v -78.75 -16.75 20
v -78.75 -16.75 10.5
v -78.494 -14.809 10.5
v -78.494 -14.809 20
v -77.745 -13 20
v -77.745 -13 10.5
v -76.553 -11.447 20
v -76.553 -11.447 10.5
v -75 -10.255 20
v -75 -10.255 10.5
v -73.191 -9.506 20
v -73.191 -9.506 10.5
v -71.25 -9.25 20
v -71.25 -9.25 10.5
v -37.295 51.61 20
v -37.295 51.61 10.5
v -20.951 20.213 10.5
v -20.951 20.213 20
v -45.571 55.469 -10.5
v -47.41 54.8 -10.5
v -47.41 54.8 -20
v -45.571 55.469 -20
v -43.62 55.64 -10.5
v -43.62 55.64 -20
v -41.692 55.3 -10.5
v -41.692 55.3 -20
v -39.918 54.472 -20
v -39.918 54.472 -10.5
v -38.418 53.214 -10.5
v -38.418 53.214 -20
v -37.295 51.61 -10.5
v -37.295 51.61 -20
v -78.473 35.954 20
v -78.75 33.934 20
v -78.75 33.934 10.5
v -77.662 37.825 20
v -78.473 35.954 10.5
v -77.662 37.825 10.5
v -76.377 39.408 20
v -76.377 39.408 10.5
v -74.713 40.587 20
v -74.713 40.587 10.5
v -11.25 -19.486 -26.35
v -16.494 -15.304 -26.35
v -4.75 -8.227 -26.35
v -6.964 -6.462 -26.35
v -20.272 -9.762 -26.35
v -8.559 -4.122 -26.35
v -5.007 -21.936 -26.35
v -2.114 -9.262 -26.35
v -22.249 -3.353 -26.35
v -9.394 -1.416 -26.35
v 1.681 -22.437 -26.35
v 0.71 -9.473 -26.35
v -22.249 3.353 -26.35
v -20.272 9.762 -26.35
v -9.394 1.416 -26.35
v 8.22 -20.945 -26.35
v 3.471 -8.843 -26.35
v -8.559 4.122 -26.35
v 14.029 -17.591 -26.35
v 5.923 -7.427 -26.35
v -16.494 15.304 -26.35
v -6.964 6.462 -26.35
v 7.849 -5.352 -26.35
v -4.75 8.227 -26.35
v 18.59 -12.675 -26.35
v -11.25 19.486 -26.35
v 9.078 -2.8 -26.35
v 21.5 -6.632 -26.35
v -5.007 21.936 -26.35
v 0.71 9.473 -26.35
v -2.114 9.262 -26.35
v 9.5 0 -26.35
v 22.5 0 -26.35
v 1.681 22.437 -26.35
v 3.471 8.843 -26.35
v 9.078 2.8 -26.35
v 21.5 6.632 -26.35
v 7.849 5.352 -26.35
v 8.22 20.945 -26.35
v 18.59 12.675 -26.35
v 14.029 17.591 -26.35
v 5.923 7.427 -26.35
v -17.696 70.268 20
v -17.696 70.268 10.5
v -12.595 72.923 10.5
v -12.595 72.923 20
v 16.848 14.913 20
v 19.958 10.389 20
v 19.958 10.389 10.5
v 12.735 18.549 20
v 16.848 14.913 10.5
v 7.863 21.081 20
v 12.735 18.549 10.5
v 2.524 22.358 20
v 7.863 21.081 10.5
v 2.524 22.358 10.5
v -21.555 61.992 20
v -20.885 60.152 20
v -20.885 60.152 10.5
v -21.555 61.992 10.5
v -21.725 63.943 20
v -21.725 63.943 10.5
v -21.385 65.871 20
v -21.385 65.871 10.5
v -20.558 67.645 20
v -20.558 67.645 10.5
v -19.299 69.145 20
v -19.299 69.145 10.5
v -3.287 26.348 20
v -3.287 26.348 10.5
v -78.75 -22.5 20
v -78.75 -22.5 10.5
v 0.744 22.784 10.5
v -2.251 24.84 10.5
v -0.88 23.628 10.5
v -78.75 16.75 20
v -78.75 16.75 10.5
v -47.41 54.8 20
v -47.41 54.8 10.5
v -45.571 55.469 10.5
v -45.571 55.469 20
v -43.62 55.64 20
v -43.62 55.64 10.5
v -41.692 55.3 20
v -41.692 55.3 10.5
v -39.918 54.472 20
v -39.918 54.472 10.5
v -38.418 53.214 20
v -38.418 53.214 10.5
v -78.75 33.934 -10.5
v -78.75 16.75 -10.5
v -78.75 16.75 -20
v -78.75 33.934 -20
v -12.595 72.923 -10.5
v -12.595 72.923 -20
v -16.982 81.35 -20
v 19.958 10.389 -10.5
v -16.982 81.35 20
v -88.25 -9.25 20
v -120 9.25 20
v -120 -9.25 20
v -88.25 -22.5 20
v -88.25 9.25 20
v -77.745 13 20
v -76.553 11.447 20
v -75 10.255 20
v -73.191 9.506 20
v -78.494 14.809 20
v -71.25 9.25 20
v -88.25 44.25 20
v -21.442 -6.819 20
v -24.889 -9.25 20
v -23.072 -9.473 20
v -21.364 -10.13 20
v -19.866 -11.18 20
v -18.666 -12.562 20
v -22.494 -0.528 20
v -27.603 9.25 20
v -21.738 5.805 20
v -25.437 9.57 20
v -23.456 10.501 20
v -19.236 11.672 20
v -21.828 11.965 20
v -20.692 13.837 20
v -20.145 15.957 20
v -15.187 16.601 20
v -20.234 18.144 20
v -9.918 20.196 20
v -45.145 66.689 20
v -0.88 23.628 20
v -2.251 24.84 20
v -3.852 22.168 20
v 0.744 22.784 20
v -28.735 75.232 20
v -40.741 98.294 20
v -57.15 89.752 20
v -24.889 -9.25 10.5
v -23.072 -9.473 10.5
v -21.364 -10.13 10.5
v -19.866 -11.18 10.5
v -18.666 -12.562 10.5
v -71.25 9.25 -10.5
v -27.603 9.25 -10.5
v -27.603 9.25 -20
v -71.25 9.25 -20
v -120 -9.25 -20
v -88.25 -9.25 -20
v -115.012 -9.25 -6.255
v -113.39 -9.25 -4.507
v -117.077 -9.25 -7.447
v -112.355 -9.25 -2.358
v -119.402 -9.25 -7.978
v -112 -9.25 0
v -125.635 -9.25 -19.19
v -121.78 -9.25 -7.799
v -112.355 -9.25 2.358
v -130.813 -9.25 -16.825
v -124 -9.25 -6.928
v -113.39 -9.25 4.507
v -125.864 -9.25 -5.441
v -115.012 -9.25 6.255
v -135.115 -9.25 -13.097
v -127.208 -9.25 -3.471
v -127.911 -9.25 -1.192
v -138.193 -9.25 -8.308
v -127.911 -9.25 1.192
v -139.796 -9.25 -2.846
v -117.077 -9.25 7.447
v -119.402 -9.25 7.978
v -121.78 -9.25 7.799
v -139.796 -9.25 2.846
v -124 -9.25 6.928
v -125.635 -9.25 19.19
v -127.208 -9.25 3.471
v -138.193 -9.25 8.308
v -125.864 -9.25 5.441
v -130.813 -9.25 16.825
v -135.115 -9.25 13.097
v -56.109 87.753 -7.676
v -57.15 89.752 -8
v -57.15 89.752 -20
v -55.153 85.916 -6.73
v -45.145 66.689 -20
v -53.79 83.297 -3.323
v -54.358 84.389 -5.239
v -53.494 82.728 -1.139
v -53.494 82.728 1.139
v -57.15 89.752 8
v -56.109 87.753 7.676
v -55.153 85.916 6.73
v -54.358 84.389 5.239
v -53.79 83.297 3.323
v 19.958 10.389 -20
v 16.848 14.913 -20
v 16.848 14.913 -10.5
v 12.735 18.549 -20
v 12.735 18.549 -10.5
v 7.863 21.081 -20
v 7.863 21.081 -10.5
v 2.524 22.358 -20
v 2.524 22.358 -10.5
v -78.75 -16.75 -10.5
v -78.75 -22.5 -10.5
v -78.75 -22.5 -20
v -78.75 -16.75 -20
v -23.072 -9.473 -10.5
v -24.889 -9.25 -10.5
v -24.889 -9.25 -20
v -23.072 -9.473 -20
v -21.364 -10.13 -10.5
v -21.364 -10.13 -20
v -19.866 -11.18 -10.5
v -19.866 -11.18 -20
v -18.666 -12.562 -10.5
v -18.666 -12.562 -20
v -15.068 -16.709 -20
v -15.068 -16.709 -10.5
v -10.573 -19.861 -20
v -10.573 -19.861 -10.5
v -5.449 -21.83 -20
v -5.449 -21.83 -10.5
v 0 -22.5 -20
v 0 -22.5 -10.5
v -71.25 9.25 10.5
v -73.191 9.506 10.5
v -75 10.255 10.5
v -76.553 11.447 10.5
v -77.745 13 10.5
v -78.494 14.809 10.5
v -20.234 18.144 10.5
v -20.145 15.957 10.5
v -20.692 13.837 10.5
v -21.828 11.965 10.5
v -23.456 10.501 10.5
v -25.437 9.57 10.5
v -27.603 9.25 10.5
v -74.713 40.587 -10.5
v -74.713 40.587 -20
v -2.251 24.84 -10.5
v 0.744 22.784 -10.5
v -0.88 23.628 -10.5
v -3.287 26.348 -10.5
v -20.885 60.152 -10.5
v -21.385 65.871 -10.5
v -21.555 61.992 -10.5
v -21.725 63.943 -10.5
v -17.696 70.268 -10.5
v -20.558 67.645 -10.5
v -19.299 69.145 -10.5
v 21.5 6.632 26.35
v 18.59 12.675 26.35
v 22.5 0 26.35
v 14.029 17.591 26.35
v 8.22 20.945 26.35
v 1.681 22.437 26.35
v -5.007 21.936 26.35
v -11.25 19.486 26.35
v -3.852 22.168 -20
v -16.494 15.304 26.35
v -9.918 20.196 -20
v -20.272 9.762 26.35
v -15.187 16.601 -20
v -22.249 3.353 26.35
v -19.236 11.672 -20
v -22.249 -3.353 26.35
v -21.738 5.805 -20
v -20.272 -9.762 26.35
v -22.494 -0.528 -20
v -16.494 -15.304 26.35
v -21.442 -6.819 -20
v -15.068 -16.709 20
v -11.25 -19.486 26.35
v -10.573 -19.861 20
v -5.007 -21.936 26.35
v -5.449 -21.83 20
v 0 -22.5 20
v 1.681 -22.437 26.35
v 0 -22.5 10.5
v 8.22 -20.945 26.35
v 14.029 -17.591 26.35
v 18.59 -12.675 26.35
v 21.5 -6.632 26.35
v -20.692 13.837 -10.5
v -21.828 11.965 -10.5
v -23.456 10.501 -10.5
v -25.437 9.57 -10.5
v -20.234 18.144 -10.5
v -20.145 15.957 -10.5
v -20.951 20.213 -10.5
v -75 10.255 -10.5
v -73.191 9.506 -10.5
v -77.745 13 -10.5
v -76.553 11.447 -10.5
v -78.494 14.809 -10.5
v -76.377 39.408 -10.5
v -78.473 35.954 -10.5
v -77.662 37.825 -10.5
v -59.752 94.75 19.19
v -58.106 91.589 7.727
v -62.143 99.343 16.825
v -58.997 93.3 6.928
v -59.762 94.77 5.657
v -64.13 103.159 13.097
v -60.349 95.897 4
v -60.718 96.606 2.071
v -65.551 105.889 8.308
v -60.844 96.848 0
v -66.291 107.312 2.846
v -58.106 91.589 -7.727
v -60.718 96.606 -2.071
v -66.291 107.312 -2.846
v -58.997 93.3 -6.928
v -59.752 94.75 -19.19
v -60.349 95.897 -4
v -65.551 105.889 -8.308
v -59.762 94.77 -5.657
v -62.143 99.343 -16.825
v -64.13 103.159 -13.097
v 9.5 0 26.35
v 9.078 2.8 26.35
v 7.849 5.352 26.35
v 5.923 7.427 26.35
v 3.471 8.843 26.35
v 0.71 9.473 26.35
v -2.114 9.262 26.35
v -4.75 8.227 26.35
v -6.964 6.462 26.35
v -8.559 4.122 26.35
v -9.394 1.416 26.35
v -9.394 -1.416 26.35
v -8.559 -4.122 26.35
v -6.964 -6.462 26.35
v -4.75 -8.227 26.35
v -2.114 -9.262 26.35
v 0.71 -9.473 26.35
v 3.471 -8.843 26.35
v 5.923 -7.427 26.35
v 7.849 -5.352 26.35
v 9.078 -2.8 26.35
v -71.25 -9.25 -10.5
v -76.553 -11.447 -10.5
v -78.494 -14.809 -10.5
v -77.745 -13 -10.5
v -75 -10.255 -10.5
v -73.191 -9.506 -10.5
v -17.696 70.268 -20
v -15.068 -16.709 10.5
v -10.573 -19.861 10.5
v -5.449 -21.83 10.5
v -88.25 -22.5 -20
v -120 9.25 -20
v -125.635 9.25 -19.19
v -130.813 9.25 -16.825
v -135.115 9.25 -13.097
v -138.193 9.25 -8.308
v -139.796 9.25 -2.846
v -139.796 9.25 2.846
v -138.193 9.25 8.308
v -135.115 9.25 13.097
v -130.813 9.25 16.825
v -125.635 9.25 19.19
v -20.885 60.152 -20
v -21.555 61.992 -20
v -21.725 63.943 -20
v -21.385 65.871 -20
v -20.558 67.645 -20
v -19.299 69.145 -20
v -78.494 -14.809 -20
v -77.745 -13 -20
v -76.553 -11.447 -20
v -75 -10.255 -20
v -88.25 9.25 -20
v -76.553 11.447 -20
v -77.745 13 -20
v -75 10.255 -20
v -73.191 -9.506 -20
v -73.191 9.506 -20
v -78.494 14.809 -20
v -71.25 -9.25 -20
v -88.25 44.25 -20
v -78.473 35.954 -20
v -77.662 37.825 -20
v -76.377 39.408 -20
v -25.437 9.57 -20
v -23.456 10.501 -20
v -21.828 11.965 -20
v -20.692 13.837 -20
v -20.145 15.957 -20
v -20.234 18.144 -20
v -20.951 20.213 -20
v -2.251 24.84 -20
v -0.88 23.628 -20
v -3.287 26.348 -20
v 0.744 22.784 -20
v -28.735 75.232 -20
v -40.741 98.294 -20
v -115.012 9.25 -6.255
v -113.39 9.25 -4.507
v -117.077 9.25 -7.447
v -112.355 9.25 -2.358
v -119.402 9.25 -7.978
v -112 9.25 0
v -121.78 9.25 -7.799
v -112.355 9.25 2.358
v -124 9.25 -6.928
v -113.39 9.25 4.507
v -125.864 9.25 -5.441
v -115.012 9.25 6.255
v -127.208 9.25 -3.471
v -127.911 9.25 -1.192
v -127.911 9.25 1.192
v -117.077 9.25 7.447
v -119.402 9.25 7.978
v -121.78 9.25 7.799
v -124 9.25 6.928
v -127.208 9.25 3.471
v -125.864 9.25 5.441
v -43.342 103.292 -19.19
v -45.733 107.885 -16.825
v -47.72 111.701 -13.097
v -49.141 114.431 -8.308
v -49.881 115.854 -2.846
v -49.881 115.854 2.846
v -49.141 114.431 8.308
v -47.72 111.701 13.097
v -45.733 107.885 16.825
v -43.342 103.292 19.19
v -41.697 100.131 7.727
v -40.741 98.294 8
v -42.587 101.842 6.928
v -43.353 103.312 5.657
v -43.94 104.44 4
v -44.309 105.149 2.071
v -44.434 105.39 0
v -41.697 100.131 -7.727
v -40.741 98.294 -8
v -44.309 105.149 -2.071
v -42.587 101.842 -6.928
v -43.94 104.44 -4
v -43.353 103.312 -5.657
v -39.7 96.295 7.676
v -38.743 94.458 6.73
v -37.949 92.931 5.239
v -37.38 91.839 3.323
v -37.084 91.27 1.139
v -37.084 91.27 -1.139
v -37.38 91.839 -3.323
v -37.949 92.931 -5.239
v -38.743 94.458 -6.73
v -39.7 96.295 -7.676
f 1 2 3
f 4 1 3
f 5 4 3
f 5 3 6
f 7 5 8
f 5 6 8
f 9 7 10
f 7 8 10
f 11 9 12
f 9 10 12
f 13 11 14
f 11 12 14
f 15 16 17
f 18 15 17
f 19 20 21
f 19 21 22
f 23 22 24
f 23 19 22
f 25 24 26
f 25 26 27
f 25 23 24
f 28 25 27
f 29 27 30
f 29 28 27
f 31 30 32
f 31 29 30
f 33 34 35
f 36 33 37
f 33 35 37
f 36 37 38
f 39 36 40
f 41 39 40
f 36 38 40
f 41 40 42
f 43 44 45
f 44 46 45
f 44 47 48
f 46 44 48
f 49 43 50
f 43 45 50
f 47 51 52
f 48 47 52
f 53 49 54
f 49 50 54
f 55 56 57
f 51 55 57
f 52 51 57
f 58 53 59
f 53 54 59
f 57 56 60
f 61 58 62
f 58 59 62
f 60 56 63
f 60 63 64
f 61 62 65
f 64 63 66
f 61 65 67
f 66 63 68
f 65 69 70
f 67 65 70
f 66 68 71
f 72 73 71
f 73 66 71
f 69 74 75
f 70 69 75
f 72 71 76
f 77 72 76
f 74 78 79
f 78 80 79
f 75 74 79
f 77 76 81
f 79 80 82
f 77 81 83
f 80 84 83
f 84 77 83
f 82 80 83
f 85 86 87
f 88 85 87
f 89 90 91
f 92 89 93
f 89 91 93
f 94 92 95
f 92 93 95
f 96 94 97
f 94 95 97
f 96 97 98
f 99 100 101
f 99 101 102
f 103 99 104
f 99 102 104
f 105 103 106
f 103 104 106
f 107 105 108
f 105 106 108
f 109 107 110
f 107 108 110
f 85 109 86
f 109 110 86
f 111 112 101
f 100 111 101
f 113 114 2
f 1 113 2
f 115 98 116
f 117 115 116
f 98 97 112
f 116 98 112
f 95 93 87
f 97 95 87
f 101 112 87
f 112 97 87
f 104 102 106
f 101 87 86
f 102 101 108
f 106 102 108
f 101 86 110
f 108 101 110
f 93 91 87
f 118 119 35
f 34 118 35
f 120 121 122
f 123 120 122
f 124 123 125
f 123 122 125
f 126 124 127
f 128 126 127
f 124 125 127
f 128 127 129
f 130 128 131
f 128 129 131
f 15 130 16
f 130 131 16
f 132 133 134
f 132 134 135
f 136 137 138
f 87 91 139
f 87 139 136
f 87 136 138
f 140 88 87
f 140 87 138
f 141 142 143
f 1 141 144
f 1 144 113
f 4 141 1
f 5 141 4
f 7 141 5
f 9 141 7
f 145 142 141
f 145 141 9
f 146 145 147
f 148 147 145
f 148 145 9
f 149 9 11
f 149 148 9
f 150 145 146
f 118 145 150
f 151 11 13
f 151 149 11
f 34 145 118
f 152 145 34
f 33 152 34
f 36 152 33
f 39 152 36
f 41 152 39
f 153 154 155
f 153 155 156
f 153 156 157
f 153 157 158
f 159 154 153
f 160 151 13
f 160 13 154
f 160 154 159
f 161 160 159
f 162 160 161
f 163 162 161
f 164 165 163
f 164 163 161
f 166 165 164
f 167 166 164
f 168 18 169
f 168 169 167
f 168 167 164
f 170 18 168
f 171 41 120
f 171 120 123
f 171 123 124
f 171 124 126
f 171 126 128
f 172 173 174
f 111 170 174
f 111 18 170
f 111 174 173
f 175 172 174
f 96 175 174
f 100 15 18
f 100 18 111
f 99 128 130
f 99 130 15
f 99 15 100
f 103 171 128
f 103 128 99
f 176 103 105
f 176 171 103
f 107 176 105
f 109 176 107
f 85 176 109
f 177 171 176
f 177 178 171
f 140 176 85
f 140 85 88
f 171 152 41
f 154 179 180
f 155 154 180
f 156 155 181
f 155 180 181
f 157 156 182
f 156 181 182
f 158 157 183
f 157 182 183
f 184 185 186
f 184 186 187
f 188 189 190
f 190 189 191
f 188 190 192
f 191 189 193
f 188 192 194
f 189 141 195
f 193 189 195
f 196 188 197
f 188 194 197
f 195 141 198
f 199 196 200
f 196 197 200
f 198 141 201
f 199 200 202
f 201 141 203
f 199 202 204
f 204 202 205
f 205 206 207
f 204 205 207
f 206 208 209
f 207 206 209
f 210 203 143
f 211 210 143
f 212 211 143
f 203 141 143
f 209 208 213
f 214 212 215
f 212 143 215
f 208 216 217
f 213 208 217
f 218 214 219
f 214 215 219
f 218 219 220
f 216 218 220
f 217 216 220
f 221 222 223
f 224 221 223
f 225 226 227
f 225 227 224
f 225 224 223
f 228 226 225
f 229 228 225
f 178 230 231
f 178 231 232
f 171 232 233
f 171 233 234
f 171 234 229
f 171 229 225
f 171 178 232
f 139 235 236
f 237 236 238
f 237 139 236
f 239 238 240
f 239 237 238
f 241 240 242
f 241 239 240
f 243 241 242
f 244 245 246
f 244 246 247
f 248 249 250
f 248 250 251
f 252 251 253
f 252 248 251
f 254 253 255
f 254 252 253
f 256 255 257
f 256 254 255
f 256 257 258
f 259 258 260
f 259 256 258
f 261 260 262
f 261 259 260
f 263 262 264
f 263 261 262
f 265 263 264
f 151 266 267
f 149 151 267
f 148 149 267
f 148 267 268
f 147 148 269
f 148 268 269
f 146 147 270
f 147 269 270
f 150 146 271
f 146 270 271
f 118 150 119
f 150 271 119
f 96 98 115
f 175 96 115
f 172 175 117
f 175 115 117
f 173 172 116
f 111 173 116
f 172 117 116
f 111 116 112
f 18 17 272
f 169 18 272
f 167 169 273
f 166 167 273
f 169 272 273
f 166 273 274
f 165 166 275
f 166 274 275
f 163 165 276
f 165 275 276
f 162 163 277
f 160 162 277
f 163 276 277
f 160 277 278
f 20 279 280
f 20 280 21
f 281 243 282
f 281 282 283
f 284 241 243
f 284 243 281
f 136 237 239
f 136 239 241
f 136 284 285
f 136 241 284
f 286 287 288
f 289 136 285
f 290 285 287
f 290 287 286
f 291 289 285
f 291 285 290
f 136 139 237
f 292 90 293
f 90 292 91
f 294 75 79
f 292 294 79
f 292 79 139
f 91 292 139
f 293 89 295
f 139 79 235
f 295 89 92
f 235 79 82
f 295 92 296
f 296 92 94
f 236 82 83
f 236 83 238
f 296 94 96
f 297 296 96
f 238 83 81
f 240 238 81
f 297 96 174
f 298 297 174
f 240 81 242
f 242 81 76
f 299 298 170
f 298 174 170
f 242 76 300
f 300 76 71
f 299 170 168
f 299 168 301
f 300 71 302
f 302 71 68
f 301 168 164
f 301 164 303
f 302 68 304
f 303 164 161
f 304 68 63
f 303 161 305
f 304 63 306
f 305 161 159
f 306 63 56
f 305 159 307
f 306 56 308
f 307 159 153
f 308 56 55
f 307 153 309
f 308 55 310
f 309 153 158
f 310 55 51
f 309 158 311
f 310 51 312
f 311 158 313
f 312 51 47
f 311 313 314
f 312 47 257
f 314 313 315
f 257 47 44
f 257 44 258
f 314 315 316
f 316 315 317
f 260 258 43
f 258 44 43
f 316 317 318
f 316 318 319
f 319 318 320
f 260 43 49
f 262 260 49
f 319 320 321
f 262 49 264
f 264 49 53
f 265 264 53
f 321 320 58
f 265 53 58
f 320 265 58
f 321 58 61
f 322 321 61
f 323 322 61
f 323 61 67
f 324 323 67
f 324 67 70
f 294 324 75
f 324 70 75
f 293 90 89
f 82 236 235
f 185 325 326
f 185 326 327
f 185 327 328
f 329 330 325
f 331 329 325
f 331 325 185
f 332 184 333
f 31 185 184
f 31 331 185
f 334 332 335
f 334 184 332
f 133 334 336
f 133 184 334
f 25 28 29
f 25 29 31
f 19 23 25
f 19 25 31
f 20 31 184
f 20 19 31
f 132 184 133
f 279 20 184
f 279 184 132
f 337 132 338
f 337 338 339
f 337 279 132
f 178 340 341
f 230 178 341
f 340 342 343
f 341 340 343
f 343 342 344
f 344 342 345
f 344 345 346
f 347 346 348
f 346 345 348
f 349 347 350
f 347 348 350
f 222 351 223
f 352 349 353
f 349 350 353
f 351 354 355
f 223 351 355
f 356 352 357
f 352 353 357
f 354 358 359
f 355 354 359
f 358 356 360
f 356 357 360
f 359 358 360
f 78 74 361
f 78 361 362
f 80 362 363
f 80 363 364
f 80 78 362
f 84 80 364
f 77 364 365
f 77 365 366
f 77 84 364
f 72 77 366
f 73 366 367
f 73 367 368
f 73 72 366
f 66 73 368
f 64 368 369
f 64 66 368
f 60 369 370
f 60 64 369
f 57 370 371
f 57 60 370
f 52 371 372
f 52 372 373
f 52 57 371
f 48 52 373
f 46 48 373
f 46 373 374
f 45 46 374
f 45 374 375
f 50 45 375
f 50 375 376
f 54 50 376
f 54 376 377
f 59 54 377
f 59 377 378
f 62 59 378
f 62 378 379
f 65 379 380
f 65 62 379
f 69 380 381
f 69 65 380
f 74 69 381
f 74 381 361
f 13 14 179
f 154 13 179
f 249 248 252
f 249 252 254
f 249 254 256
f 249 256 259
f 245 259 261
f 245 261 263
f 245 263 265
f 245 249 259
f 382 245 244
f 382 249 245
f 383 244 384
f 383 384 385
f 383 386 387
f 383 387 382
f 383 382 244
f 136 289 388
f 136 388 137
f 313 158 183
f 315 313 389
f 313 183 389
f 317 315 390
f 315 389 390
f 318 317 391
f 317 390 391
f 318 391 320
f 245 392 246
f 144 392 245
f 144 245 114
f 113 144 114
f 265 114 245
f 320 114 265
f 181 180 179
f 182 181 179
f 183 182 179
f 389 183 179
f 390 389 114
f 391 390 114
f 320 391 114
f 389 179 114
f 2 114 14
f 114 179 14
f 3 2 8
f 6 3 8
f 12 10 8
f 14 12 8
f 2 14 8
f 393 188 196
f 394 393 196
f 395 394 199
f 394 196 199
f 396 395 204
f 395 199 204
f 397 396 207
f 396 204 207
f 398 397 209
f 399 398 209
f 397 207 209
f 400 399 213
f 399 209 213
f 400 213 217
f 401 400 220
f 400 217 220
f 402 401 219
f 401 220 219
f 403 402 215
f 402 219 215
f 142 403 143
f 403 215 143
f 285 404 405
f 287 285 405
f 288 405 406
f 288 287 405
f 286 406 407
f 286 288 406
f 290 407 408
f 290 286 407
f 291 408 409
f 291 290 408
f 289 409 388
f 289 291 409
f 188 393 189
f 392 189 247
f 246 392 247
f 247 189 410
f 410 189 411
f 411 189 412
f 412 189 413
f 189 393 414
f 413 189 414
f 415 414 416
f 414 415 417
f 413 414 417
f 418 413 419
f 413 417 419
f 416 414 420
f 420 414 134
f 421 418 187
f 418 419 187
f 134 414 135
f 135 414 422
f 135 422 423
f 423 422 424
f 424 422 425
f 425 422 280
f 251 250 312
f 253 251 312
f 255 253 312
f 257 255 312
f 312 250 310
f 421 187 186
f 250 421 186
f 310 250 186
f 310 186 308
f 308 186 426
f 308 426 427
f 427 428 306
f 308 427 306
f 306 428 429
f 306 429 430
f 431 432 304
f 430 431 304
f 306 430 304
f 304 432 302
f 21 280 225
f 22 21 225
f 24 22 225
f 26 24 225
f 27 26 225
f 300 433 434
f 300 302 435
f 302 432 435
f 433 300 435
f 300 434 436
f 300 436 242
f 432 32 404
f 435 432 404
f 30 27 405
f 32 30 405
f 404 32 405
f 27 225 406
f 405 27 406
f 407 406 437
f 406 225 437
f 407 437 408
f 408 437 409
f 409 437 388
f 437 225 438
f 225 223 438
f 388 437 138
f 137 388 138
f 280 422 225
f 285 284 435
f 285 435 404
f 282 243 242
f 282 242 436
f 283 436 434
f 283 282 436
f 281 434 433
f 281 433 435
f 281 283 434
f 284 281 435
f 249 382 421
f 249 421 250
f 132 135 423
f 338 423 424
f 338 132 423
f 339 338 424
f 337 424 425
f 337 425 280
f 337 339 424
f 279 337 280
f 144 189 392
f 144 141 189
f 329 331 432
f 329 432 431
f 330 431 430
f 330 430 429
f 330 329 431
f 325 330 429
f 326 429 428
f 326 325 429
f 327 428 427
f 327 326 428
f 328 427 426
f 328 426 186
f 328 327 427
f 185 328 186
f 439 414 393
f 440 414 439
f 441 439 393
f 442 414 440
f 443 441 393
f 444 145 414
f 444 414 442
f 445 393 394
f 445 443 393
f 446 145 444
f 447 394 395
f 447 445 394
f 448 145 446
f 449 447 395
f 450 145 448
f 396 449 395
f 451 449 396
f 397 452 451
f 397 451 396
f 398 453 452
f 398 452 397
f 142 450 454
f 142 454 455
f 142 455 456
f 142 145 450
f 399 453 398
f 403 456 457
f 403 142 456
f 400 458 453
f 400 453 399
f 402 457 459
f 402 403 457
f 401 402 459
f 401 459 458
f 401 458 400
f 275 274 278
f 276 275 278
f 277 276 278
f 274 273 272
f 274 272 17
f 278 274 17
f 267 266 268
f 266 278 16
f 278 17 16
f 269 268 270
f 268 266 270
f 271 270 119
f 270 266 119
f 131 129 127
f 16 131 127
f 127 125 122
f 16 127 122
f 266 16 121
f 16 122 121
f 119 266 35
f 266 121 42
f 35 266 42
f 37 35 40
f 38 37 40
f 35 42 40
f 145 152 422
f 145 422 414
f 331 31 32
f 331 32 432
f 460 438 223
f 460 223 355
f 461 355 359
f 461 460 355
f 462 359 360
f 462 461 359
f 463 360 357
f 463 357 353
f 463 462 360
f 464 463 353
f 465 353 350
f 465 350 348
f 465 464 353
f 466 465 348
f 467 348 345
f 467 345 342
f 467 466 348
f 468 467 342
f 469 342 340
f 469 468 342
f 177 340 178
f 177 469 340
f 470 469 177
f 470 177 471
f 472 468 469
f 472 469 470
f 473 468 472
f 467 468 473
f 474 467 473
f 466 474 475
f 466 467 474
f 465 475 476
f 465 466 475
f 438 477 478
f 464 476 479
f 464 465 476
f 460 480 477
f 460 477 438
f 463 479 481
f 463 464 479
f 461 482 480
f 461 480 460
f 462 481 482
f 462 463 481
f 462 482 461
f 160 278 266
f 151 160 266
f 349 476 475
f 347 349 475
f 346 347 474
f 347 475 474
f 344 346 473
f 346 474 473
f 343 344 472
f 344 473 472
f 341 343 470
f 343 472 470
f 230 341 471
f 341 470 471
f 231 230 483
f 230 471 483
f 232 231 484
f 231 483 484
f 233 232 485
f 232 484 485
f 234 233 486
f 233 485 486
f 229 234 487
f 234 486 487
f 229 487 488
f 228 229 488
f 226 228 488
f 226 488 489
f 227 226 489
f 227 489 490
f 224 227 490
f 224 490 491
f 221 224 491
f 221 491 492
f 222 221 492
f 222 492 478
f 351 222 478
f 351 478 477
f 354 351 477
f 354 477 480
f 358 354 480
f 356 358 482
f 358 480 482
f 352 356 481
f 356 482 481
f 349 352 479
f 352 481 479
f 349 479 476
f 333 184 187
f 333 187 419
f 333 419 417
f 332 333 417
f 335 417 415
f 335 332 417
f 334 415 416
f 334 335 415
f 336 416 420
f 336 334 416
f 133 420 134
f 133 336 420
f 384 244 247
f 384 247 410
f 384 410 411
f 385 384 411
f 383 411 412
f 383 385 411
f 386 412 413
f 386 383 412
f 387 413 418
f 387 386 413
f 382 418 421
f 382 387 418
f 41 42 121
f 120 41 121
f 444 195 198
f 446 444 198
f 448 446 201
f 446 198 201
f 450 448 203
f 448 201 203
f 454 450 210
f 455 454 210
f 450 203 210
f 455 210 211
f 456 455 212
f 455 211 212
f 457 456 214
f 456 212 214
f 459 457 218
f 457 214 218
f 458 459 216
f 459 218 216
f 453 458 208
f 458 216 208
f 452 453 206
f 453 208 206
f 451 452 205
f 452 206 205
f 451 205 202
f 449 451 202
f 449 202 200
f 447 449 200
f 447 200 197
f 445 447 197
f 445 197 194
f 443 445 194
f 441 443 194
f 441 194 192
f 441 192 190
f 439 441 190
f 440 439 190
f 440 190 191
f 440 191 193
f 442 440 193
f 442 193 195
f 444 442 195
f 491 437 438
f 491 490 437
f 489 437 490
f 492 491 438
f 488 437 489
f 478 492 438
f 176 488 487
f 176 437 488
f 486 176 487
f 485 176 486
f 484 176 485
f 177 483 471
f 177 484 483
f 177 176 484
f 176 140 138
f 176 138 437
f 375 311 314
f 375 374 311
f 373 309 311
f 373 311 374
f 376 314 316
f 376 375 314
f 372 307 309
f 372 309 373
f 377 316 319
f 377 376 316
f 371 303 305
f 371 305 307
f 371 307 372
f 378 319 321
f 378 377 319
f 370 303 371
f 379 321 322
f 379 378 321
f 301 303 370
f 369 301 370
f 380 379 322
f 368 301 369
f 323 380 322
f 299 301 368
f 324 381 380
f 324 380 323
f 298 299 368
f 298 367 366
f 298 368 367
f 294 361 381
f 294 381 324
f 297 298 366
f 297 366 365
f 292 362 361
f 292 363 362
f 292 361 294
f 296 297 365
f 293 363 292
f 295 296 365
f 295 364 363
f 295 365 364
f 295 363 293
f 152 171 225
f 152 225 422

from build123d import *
from build123d.topology import SkipClean

# Parameters (mm, degrees)
BOSS_EXTRU_1_DEPTH      = 20
BOSS_EXTRU_2_DEPTH      = 26.35
BOSS_EXTRU_2_DEPTH_BACK = 26.35
ESQUISSE2_5_R           = 22.5
ESQUISSE2_5_R_2         = 9.5
BOSS_EXTRU_3_DEPTH      = 18.5
BOSS_EXTRU_4_DEPTH      = 18.5
ESQUISSE5_R             = 8
ENL_V_MAT_EXTRU_1_DEPTH = 188.483465609
ESQUISSE6_R             = 8
ENL_V_MAT_EXTRU_2_DEPTH = 190.711724403
ENL_V_START             = -9.5
ENL_V_MAT_EXTRU_3_DEPTH = 9.5


with BuildPart() as part:
    # Esquisse2 → Boss.-Extru.1 (new, symmetric)
    with BuildSketch(Plane.XY):
        with BuildLine():
            Line((-88.25, -22.5), (0, -22.5))
            ThreePointArc((0, -22.5), (-19.23551709, 11.672398309), (19.957743747, 10.389343798))
            Line((19.957743747, 10.389343798), (-16.981934979, 81.349806406))
            Line((-16.981934979, 81.349806406), (-28.734828519, 75.231637281))
            Line((-28.734828519, 75.231637281), (-40.740502796, 98.294322989))
            Line((-40.740502796, 98.294322989), (-57.15020321, 89.751973644))
            Line((-57.15020321, 89.751973644), (-45.144528933, 66.689287936))
            Line((-45.144528933, 66.689287936), (-88.25, 44.25))
            Line((-88.25, 44.25), (-88.25, 9.25))
            Line((-88.25, 9.25), (-120, 9.25))
            Line((-120, 9.25), (-120, -9.25))
            Line((-120, -9.25), (-88.25, -9.25))
            Line((-88.25, -9.25), (-88.25, -22.5))
        make_face()
    extrude(amount=BOSS_EXTRU_1_DEPTH, both=True)

    # Esquisse2<5> → Boss.-Extru.2 (add, two sides: drawn at the far end of the back side and taken through both)
    with BuildSketch(Plane.XY.offset(-BOSS_EXTRU_2_DEPTH_BACK)):
        Circle(ESQUISSE2_5_R)
        Circle(ESQUISSE2_5_R_2, mode=Mode.SUBTRACT)
    extrude(amount=BOSS_EXTRU_2_DEPTH + BOSS_EXTRU_2_DEPTH_BACK)

    # Esquisse3 → Boss.-Extru.3 (add)
    with BuildSketch(Plane.XZ.offset(9.25)):
        with BuildLine():
            Line((-120, 20), (-120, -20))
            ThreePointArc((-120, -20), (-140, 0), (-120, 20))
        make_face()
    extrude(amount=-BOSS_EXTRU_3_DEPTH)

    # Esquisse4 → Boss.-Extru.4 (add)
    with BuildSketch(Plane(origin=(8.204850207, 4.271174672, 0), x_dir=(0, 0, -1), z_dir=(0.8870108331782227, 0.46174861323503186, 0))):
        with BuildLine():
            Line((-20, 106), (20, 106))
            ThreePointArc((20, 106), (0, 126), (-20, 106))
        make_face()
    extrude(amount=-BOSS_EXTRU_4_DEPTH)

    # Esquisse5 → Enlèv. mat.-Extru.1 (cut, through all)
    with BuildSketch(Plane(origin=(8.204850207, 4.271174672, 0), x_dir=(0, 0, -1), z_dir=(0.8870108331782227, 0.46174861323503186, 0))):
        with Locations(Location((0, 106, 0), (0, 0, 90))):
            Circle(ESQUISSE5_R)
    extrude(amount=-ENL_V_MAT_EXTRU_1_DEPTH, mode=Mode.SUBTRACT)

    # Esquisse6 → Enlèv. mat.-Extru.2 (cut, through all)
    with BuildSketch(Plane.XZ.offset(9.25)):
        with Locations((-120, 0)):
            Circle(ESQUISSE6_R)
    extrude(amount=-ENL_V_MAT_EXTRU_2_DEPTH, mode=Mode.SUBTRACT)

    # Esquisse7 → Enlèv. mat.-Extru.3 (cut)
    with SkipClean():  # the faces are left unmerged after this step: merging them gives an invalid solid
        with BuildSketch(Plane.XY.offset(20).offset(ENL_V_START)):
            with BuildLine():
                Line((-17.695635444, 70.268148965), (-12.595323154, 72.923203491))
                Line((-12.595323154, 72.923203491), (19.957743747, 10.389343798))
                ThreePointArc((19.957743747, 10.389343798), (12.734529101, 18.549441193), (2.52390035, 22.3579947))
                ThreePointArc((2.52390035, 22.3579947), (-0.879642567, 23.627512536), (-3.287380782, 26.347545001))
                Line((-3.287380782, 26.347545001), (-20.885102094, 60.152453117))
                ThreePointArc((-20.885102094, 60.152453117), (-21.385397976, 65.870861212), (-17.695635444, 70.268148965))
            make_face()
            with BuildLine():
                Line((-74.713114599, 40.586728011), (-47.410498356, 54.799570422))
                ThreePointArc((-47.410498356, 54.799570422), (-41.69209026, 55.299866303), (-37.294802508, 51.610103772))
                Line((-37.294802508, 51.610103772), (-20.950564458, 20.213114599))
                ThreePointArc((-20.950564458, 20.213114599), (-21.191306677, 12.859200564), (-27.603145707, 9.25))
                Line((-27.603145707, 9.25), (-71.25, 9.25))
                ThreePointArc((-71.25, 9.25), (-76.553300859, 11.446699141), (-78.75, 16.75))
                Line((-78.75, 16.75), (-78.75, 33.934146763))
                ThreePointArc((-78.75, 33.934146763), (-77.66183903, 37.824946199), (-74.713114599, 40.586728011))
            make_face()
            with BuildLine():
                Line((-71.25, -9.25), (-24.888501361, -9.25))
                ThreePointArc((-24.888501361, -9.25), (-21.364033316, -10.129718662), (-18.666376021, -12.5625))
                ThreePointArc((-18.666376021, -12.5625), (-10.573404135, -19.860844015), (0, -22.5))
                Line((0, -22.5), (-78.75, -22.5))
                Line((-78.75, -22.5), (-78.75, -16.75))
                ThreePointArc((-78.75, -16.75), (-76.553300859, -11.446699141), (-71.25, -9.25))
            make_face()
        enl_v_mat_extru_3 = extrude(amount=ENL_V_MAT_EXTRU_3_DEPTH, mode=Mode.SUBTRACT)

    # Symétrie1: Enlèv. mat.-Extru.3 across plane
    add(enl_v_mat_extru_3.mirror(Plane.XY), mode=Mode.SUBTRACT)


solid = part.part
